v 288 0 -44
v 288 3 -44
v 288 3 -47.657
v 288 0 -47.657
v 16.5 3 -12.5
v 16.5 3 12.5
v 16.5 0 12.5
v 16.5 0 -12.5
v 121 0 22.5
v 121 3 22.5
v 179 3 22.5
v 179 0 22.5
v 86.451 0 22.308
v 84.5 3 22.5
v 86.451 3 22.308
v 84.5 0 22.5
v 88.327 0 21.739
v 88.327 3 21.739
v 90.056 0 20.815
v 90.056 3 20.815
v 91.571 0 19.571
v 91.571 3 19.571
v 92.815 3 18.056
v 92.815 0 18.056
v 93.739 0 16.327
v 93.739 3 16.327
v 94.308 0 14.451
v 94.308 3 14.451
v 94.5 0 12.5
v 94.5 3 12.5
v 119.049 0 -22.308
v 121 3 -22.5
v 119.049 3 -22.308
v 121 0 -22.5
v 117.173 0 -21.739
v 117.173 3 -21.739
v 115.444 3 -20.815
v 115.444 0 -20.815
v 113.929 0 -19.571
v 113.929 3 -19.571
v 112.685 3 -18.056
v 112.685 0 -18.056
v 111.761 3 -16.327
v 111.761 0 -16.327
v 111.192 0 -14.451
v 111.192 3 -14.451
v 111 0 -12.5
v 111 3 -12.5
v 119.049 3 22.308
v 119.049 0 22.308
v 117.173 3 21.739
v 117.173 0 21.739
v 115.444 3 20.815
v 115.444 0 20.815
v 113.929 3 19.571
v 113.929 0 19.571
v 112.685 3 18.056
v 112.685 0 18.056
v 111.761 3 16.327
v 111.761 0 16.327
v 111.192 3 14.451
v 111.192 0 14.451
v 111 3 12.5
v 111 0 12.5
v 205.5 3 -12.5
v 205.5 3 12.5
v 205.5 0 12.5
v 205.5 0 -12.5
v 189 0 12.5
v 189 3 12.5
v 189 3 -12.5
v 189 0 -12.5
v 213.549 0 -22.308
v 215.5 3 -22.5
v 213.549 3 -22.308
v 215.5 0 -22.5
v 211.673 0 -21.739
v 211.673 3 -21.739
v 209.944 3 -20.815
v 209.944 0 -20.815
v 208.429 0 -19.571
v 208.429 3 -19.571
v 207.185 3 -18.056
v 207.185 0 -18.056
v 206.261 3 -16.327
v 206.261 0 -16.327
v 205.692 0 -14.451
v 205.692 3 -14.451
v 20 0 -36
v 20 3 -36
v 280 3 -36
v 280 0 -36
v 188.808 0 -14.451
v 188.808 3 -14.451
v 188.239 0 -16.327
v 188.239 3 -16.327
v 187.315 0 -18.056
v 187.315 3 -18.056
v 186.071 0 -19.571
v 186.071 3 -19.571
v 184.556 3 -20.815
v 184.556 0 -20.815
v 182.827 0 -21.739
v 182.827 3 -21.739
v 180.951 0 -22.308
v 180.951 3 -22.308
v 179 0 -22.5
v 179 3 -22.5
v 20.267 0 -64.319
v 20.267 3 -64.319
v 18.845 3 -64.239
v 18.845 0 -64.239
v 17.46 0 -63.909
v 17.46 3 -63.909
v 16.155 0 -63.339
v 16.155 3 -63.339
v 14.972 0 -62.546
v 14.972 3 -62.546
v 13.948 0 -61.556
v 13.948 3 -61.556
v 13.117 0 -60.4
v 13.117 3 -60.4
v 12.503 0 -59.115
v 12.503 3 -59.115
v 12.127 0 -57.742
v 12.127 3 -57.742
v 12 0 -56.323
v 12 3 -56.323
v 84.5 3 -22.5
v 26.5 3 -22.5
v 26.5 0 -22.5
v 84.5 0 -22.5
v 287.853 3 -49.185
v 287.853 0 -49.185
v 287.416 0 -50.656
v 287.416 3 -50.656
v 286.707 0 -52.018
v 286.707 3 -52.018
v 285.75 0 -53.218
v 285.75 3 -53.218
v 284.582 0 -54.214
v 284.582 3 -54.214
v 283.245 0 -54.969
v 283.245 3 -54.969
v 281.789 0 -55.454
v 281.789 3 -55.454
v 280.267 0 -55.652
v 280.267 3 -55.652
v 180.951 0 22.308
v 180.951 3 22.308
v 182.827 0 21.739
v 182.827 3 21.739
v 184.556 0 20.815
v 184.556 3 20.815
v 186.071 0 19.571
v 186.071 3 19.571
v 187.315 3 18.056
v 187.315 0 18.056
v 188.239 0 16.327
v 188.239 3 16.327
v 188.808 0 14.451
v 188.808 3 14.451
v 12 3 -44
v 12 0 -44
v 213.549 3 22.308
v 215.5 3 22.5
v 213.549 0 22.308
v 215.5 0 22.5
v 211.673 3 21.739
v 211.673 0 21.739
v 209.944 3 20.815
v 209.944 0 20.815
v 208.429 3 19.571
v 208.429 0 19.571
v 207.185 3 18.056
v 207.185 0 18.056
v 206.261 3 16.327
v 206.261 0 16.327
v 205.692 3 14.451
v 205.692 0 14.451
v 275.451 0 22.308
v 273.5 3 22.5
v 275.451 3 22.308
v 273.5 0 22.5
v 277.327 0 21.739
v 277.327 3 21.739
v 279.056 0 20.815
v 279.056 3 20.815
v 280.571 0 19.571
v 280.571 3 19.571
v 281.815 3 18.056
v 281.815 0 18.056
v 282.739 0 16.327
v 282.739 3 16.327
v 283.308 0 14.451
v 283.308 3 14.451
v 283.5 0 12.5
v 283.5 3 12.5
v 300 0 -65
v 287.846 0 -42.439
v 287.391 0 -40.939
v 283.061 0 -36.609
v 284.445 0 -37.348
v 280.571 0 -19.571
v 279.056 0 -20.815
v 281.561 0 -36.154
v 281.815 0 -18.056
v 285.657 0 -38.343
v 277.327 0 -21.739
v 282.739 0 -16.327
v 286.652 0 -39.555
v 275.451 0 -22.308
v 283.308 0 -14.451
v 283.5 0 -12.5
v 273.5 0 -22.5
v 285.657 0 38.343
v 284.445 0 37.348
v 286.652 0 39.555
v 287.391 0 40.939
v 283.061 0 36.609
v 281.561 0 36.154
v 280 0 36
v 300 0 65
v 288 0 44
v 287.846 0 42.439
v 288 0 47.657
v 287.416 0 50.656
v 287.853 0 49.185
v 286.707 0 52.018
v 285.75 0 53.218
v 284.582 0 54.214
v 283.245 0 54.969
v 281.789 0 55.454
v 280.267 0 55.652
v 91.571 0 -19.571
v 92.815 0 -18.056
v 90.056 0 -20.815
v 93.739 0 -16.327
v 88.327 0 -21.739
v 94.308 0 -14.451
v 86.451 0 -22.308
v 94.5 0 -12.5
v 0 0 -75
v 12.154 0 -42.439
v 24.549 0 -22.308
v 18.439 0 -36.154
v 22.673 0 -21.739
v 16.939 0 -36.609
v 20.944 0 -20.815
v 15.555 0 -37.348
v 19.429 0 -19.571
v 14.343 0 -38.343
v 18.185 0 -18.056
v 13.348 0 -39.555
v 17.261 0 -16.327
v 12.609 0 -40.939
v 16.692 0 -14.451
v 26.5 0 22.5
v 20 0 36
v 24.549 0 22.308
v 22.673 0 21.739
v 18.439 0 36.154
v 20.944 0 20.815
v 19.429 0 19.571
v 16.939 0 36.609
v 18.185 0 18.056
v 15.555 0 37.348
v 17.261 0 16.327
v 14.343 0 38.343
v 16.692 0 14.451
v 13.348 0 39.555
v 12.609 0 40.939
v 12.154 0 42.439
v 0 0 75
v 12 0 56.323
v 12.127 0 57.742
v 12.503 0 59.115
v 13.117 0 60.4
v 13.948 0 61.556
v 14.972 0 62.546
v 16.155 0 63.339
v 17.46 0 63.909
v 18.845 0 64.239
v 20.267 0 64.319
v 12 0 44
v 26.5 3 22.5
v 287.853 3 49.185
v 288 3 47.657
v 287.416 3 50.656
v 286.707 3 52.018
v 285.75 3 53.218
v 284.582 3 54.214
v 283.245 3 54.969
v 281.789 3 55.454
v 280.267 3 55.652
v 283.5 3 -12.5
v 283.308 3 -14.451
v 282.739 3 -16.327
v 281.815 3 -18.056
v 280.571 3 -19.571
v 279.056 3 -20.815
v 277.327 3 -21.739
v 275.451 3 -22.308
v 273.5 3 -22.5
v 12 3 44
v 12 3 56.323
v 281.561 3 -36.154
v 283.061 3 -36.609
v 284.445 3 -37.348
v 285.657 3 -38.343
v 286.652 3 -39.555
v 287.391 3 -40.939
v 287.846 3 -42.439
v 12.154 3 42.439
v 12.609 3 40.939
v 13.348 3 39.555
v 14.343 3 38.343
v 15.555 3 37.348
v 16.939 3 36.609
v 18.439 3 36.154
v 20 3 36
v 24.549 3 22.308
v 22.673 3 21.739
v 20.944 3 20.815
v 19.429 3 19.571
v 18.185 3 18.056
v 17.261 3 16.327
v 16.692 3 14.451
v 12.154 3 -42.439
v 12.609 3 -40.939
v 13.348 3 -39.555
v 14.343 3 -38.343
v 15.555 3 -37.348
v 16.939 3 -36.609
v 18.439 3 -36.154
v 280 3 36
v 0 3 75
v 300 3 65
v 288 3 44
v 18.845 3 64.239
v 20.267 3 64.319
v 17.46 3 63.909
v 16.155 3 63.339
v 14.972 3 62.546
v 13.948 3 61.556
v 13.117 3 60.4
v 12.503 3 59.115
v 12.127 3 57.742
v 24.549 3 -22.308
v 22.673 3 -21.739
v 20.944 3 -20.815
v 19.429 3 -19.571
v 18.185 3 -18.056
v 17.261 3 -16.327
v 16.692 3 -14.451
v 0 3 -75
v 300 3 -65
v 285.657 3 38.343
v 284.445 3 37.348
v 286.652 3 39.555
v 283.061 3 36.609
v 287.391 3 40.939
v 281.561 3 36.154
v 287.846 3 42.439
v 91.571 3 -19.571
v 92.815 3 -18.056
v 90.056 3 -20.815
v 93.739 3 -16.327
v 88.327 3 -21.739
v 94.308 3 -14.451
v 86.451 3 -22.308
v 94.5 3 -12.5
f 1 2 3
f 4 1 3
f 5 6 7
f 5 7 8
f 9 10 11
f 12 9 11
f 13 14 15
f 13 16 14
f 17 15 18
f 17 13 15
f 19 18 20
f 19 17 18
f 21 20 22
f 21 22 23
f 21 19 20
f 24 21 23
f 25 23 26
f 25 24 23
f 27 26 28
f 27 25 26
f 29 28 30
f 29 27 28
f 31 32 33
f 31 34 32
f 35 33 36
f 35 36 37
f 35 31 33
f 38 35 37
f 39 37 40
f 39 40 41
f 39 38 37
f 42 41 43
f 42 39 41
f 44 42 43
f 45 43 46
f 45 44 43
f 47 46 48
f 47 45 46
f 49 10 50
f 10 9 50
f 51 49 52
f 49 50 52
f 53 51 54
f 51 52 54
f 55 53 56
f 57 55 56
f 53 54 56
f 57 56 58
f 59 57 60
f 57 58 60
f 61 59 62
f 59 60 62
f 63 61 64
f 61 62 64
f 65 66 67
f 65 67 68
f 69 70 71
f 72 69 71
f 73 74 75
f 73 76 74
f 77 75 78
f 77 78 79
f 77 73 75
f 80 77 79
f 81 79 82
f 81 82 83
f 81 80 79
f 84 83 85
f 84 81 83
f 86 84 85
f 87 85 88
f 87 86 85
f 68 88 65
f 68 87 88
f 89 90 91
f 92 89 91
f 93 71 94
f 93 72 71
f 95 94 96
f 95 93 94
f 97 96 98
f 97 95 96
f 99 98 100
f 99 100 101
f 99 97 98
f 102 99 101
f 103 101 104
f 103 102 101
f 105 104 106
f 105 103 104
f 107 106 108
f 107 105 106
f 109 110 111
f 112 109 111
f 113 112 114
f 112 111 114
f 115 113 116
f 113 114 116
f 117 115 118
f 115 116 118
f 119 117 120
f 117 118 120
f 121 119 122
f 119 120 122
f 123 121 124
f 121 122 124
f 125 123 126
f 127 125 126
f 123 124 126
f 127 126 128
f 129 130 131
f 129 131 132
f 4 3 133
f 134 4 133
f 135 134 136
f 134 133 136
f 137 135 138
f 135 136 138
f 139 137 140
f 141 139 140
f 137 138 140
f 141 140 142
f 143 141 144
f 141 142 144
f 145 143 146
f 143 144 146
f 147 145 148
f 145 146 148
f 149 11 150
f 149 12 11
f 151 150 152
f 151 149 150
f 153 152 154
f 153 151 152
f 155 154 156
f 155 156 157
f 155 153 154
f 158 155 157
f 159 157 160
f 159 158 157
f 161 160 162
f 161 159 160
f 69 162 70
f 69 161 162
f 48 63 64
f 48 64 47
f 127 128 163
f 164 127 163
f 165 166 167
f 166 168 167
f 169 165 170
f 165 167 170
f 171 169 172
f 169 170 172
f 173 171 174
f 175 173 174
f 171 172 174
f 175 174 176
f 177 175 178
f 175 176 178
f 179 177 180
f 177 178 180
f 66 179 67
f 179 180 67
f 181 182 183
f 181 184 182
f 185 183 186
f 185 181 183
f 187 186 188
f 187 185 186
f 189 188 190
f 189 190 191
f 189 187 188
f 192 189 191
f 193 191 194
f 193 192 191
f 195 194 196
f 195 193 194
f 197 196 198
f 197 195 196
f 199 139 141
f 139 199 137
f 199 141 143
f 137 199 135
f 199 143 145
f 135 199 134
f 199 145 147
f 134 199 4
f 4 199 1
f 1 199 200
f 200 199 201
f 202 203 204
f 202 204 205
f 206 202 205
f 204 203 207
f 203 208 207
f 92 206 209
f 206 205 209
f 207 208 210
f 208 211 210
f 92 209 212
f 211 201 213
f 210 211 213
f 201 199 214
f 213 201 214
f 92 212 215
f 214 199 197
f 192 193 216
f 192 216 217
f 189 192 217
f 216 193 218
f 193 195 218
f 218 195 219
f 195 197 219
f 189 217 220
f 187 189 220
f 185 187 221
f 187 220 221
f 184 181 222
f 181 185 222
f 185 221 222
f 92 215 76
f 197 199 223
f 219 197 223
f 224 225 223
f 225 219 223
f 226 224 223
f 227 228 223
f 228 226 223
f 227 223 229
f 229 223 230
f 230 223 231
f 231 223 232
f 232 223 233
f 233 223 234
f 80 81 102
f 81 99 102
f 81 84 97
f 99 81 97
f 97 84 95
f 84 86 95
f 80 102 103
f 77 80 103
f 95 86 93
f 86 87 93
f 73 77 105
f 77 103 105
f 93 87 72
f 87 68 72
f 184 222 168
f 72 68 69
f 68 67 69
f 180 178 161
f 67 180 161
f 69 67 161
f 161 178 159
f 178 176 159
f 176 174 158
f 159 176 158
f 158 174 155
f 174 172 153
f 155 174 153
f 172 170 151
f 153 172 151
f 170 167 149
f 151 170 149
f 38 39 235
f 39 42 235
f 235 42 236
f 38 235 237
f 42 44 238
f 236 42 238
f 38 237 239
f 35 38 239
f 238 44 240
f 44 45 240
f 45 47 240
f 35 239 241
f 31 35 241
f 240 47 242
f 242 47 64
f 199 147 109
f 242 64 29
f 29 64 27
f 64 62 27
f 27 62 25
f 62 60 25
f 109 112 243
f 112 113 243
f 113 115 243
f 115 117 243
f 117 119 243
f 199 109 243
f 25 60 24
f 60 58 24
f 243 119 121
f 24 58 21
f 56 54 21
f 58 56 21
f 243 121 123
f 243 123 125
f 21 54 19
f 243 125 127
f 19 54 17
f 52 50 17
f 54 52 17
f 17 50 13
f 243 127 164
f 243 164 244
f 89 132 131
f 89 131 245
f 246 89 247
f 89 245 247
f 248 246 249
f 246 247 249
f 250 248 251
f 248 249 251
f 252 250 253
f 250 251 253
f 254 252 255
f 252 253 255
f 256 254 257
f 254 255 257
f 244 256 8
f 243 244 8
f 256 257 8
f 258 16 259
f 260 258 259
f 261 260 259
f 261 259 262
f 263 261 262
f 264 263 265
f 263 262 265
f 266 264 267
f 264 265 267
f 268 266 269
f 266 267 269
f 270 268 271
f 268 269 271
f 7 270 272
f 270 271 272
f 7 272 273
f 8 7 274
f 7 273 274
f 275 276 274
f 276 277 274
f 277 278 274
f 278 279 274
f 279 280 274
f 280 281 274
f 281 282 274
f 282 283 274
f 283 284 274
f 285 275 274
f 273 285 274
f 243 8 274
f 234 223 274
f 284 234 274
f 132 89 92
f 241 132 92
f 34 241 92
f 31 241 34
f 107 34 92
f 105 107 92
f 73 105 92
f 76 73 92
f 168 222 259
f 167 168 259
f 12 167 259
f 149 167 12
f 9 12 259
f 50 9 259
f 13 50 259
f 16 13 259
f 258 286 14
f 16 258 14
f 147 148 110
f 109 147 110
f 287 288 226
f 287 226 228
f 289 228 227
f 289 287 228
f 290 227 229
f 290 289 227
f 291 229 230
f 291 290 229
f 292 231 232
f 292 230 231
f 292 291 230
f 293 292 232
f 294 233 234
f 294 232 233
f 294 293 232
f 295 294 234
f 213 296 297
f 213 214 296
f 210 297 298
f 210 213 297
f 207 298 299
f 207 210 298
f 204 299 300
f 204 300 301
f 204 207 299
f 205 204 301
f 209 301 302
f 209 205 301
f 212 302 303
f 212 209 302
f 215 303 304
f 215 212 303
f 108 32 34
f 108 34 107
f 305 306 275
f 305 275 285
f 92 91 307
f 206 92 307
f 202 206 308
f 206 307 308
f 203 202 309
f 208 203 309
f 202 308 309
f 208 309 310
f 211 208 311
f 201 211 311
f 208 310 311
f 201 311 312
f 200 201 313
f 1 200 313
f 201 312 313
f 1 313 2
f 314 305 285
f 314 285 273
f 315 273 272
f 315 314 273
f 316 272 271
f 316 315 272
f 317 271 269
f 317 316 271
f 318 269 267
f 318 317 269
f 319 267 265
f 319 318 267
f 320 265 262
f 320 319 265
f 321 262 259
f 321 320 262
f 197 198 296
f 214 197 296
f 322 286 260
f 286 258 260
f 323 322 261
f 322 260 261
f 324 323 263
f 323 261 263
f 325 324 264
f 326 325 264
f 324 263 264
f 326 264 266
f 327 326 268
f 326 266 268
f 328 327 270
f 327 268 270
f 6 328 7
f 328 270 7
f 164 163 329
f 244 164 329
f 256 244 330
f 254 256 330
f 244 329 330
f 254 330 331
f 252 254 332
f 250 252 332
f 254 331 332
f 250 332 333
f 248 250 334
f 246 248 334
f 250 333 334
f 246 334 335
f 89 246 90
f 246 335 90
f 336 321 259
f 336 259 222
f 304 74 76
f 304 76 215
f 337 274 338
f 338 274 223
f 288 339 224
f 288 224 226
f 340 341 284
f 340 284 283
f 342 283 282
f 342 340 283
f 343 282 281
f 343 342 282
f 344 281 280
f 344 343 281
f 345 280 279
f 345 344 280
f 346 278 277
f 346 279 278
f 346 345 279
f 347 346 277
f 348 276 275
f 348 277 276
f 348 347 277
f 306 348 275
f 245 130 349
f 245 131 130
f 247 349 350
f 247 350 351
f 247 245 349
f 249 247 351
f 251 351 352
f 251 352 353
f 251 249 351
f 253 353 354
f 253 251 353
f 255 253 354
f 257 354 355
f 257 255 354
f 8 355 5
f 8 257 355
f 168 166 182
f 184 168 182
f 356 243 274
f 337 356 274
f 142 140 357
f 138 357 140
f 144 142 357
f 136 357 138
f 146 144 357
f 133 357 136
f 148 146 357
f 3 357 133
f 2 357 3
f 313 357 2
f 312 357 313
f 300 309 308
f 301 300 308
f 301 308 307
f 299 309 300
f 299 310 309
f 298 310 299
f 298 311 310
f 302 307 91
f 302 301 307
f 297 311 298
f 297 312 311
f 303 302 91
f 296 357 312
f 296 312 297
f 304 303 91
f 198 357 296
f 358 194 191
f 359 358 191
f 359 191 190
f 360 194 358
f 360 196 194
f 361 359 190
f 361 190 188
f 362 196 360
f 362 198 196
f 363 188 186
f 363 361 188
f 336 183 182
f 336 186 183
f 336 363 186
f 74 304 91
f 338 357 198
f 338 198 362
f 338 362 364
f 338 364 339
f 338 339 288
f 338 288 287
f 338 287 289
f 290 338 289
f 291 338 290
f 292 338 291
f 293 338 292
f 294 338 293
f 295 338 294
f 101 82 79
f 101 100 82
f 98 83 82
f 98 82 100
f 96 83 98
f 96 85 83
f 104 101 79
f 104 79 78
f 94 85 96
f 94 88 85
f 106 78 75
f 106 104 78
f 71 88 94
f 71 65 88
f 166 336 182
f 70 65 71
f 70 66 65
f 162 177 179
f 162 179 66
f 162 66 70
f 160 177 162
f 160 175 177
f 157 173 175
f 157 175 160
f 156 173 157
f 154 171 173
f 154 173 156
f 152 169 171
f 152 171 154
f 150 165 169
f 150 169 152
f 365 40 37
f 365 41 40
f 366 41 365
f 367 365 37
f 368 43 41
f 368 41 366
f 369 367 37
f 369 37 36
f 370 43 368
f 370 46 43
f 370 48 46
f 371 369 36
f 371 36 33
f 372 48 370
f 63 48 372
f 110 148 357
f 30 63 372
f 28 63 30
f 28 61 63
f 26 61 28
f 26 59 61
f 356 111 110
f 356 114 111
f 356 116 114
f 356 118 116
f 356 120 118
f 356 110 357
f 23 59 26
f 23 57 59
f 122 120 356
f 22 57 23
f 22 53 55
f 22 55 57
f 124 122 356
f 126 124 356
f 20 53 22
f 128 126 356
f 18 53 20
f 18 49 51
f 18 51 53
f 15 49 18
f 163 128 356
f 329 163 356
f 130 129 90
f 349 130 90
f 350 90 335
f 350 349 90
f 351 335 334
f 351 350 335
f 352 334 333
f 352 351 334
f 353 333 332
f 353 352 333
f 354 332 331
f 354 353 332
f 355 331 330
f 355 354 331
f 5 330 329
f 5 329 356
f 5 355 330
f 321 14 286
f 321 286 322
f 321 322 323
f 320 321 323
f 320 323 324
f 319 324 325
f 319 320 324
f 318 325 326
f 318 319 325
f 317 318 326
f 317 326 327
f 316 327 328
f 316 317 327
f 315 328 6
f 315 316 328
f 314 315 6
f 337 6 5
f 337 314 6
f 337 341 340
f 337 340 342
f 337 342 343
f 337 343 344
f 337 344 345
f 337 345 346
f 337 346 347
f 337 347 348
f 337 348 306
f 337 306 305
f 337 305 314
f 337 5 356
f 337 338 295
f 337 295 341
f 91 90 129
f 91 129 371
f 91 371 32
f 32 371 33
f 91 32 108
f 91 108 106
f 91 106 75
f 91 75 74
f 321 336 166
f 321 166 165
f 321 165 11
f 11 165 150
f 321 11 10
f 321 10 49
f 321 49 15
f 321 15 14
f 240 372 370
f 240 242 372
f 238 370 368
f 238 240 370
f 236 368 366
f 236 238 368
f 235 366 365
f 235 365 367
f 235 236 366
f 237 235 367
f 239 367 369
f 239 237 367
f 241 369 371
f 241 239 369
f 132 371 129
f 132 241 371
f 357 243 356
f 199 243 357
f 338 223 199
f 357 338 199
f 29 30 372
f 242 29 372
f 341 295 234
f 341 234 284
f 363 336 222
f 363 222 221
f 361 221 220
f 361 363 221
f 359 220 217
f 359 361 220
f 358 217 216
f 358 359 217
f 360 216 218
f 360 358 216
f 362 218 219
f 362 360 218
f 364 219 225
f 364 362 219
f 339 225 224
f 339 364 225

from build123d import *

# Parameters (mm, degrees)
BOSS_EXTRUDE1_DEPTH = 3
SKETCH2_W           = 78
SKETCH2_H           = 45
CUT_EXTRUDE1_DEPTH  = 10
FILLET1_R           = 10
CUT_EXTRUDE2_DEPTH  = 10


with BuildPart() as part:
    # Sketch1 → Boss-Extrude1 (new body)
    with BuildSketch(Plane(origin=(0, 0, 0), x_dir=(1, 0, 0), z_dir=(0, 1, 0))):
        Polygon((0, 0), (0, 75.000000004), (300, 65), (300, 0), align=None)
    boss_extrude1 = extrude(amount=BOSS_EXTRUDE1_DEPTH)

    # Mirror1: Boss-Extrude1 across Front Plane
    add(boss_extrude1.mirror(Plane.XY))

    # Sketch2 → Cut-Extrude1 (cut)
    with BuildSketch(Plane(origin=(0, 3, 0), x_dir=(1, 0, 0), z_dir=(0, 1, 0))):
        with Locations((55.5, 0)):
            Rectangle(SKETCH2_W, SKETCH2_H)
        with Locations((150, 0)):
            Rectangle(SKETCH2_W, SKETCH2_H)
        with Locations((244.5, 0)):
            Rectangle(SKETCH2_W, SKETCH2_H)
    extrude(amount=-CUT_EXTRUDE1_DEPTH, mode=Mode.SUBTRACT)

    # Fillet1
    fillet1_edges = [part.edges().sort_by_distance(p)[0] for p in [
        (16.5, 1.5, 22.5),
        (16.5, 1.5, -22.5),
        (94.5, 1.5, -22.5),
        (94.5, 1.5, 22.5),
        (111, 1.5, 22.5),
        (111, 1.5, -22.5),
        (189, 1.5, -22.5),
        (189, 1.5, 22.5),
        (205.5, 1.5, 22.5),
        (205.5, 1.5, -22.5),
        (283.5, 1.5, -22.5),
        (283.5, 1.5, 22.5),
    ]]
    fillet(fillet1_edges, radius=FILLET1_R)

    # Sketch3 → Cut-Extrude2 (cut)
    with BuildSketch(Plane(origin=(0, 3, 0), x_dir=(1, 0, 0), z_dir=(0, 1, 0))):
        with BuildLine():
            Line((12, 56.323336113), (12, 44))
            ThreePointArc((12, 44), (14.343145751, 38.343145751), (20, 36))
            Line((20, 36), (280, 36))
            ThreePointArc((280, 36), (285.656854249, 38.343145751), (288, 44))
            Line((288, 44), (288, 47.656669443))
            ThreePointArc((288, 47.656669443), (285.750310824, 53.218496969), (280.266518642, 55.652228699))
            Line((280.266518642, 55.652228699), (20.266518642, 64.318895369))
            ThreePointArc((20.266518642, 64.318895369), (14.438172474, 62.073646937), (12, 56.323336113))
        make_face()
    cut_extrude2 = extrude(amount=-CUT_EXTRUDE2_DEPTH, mode=Mode.SUBTRACT)

    # Mirror2: Cut-Extrude2 across plane
    add(cut_extrude2.mirror(Plane.XY), mode=Mode.SUBTRACT)


solid = part.part
